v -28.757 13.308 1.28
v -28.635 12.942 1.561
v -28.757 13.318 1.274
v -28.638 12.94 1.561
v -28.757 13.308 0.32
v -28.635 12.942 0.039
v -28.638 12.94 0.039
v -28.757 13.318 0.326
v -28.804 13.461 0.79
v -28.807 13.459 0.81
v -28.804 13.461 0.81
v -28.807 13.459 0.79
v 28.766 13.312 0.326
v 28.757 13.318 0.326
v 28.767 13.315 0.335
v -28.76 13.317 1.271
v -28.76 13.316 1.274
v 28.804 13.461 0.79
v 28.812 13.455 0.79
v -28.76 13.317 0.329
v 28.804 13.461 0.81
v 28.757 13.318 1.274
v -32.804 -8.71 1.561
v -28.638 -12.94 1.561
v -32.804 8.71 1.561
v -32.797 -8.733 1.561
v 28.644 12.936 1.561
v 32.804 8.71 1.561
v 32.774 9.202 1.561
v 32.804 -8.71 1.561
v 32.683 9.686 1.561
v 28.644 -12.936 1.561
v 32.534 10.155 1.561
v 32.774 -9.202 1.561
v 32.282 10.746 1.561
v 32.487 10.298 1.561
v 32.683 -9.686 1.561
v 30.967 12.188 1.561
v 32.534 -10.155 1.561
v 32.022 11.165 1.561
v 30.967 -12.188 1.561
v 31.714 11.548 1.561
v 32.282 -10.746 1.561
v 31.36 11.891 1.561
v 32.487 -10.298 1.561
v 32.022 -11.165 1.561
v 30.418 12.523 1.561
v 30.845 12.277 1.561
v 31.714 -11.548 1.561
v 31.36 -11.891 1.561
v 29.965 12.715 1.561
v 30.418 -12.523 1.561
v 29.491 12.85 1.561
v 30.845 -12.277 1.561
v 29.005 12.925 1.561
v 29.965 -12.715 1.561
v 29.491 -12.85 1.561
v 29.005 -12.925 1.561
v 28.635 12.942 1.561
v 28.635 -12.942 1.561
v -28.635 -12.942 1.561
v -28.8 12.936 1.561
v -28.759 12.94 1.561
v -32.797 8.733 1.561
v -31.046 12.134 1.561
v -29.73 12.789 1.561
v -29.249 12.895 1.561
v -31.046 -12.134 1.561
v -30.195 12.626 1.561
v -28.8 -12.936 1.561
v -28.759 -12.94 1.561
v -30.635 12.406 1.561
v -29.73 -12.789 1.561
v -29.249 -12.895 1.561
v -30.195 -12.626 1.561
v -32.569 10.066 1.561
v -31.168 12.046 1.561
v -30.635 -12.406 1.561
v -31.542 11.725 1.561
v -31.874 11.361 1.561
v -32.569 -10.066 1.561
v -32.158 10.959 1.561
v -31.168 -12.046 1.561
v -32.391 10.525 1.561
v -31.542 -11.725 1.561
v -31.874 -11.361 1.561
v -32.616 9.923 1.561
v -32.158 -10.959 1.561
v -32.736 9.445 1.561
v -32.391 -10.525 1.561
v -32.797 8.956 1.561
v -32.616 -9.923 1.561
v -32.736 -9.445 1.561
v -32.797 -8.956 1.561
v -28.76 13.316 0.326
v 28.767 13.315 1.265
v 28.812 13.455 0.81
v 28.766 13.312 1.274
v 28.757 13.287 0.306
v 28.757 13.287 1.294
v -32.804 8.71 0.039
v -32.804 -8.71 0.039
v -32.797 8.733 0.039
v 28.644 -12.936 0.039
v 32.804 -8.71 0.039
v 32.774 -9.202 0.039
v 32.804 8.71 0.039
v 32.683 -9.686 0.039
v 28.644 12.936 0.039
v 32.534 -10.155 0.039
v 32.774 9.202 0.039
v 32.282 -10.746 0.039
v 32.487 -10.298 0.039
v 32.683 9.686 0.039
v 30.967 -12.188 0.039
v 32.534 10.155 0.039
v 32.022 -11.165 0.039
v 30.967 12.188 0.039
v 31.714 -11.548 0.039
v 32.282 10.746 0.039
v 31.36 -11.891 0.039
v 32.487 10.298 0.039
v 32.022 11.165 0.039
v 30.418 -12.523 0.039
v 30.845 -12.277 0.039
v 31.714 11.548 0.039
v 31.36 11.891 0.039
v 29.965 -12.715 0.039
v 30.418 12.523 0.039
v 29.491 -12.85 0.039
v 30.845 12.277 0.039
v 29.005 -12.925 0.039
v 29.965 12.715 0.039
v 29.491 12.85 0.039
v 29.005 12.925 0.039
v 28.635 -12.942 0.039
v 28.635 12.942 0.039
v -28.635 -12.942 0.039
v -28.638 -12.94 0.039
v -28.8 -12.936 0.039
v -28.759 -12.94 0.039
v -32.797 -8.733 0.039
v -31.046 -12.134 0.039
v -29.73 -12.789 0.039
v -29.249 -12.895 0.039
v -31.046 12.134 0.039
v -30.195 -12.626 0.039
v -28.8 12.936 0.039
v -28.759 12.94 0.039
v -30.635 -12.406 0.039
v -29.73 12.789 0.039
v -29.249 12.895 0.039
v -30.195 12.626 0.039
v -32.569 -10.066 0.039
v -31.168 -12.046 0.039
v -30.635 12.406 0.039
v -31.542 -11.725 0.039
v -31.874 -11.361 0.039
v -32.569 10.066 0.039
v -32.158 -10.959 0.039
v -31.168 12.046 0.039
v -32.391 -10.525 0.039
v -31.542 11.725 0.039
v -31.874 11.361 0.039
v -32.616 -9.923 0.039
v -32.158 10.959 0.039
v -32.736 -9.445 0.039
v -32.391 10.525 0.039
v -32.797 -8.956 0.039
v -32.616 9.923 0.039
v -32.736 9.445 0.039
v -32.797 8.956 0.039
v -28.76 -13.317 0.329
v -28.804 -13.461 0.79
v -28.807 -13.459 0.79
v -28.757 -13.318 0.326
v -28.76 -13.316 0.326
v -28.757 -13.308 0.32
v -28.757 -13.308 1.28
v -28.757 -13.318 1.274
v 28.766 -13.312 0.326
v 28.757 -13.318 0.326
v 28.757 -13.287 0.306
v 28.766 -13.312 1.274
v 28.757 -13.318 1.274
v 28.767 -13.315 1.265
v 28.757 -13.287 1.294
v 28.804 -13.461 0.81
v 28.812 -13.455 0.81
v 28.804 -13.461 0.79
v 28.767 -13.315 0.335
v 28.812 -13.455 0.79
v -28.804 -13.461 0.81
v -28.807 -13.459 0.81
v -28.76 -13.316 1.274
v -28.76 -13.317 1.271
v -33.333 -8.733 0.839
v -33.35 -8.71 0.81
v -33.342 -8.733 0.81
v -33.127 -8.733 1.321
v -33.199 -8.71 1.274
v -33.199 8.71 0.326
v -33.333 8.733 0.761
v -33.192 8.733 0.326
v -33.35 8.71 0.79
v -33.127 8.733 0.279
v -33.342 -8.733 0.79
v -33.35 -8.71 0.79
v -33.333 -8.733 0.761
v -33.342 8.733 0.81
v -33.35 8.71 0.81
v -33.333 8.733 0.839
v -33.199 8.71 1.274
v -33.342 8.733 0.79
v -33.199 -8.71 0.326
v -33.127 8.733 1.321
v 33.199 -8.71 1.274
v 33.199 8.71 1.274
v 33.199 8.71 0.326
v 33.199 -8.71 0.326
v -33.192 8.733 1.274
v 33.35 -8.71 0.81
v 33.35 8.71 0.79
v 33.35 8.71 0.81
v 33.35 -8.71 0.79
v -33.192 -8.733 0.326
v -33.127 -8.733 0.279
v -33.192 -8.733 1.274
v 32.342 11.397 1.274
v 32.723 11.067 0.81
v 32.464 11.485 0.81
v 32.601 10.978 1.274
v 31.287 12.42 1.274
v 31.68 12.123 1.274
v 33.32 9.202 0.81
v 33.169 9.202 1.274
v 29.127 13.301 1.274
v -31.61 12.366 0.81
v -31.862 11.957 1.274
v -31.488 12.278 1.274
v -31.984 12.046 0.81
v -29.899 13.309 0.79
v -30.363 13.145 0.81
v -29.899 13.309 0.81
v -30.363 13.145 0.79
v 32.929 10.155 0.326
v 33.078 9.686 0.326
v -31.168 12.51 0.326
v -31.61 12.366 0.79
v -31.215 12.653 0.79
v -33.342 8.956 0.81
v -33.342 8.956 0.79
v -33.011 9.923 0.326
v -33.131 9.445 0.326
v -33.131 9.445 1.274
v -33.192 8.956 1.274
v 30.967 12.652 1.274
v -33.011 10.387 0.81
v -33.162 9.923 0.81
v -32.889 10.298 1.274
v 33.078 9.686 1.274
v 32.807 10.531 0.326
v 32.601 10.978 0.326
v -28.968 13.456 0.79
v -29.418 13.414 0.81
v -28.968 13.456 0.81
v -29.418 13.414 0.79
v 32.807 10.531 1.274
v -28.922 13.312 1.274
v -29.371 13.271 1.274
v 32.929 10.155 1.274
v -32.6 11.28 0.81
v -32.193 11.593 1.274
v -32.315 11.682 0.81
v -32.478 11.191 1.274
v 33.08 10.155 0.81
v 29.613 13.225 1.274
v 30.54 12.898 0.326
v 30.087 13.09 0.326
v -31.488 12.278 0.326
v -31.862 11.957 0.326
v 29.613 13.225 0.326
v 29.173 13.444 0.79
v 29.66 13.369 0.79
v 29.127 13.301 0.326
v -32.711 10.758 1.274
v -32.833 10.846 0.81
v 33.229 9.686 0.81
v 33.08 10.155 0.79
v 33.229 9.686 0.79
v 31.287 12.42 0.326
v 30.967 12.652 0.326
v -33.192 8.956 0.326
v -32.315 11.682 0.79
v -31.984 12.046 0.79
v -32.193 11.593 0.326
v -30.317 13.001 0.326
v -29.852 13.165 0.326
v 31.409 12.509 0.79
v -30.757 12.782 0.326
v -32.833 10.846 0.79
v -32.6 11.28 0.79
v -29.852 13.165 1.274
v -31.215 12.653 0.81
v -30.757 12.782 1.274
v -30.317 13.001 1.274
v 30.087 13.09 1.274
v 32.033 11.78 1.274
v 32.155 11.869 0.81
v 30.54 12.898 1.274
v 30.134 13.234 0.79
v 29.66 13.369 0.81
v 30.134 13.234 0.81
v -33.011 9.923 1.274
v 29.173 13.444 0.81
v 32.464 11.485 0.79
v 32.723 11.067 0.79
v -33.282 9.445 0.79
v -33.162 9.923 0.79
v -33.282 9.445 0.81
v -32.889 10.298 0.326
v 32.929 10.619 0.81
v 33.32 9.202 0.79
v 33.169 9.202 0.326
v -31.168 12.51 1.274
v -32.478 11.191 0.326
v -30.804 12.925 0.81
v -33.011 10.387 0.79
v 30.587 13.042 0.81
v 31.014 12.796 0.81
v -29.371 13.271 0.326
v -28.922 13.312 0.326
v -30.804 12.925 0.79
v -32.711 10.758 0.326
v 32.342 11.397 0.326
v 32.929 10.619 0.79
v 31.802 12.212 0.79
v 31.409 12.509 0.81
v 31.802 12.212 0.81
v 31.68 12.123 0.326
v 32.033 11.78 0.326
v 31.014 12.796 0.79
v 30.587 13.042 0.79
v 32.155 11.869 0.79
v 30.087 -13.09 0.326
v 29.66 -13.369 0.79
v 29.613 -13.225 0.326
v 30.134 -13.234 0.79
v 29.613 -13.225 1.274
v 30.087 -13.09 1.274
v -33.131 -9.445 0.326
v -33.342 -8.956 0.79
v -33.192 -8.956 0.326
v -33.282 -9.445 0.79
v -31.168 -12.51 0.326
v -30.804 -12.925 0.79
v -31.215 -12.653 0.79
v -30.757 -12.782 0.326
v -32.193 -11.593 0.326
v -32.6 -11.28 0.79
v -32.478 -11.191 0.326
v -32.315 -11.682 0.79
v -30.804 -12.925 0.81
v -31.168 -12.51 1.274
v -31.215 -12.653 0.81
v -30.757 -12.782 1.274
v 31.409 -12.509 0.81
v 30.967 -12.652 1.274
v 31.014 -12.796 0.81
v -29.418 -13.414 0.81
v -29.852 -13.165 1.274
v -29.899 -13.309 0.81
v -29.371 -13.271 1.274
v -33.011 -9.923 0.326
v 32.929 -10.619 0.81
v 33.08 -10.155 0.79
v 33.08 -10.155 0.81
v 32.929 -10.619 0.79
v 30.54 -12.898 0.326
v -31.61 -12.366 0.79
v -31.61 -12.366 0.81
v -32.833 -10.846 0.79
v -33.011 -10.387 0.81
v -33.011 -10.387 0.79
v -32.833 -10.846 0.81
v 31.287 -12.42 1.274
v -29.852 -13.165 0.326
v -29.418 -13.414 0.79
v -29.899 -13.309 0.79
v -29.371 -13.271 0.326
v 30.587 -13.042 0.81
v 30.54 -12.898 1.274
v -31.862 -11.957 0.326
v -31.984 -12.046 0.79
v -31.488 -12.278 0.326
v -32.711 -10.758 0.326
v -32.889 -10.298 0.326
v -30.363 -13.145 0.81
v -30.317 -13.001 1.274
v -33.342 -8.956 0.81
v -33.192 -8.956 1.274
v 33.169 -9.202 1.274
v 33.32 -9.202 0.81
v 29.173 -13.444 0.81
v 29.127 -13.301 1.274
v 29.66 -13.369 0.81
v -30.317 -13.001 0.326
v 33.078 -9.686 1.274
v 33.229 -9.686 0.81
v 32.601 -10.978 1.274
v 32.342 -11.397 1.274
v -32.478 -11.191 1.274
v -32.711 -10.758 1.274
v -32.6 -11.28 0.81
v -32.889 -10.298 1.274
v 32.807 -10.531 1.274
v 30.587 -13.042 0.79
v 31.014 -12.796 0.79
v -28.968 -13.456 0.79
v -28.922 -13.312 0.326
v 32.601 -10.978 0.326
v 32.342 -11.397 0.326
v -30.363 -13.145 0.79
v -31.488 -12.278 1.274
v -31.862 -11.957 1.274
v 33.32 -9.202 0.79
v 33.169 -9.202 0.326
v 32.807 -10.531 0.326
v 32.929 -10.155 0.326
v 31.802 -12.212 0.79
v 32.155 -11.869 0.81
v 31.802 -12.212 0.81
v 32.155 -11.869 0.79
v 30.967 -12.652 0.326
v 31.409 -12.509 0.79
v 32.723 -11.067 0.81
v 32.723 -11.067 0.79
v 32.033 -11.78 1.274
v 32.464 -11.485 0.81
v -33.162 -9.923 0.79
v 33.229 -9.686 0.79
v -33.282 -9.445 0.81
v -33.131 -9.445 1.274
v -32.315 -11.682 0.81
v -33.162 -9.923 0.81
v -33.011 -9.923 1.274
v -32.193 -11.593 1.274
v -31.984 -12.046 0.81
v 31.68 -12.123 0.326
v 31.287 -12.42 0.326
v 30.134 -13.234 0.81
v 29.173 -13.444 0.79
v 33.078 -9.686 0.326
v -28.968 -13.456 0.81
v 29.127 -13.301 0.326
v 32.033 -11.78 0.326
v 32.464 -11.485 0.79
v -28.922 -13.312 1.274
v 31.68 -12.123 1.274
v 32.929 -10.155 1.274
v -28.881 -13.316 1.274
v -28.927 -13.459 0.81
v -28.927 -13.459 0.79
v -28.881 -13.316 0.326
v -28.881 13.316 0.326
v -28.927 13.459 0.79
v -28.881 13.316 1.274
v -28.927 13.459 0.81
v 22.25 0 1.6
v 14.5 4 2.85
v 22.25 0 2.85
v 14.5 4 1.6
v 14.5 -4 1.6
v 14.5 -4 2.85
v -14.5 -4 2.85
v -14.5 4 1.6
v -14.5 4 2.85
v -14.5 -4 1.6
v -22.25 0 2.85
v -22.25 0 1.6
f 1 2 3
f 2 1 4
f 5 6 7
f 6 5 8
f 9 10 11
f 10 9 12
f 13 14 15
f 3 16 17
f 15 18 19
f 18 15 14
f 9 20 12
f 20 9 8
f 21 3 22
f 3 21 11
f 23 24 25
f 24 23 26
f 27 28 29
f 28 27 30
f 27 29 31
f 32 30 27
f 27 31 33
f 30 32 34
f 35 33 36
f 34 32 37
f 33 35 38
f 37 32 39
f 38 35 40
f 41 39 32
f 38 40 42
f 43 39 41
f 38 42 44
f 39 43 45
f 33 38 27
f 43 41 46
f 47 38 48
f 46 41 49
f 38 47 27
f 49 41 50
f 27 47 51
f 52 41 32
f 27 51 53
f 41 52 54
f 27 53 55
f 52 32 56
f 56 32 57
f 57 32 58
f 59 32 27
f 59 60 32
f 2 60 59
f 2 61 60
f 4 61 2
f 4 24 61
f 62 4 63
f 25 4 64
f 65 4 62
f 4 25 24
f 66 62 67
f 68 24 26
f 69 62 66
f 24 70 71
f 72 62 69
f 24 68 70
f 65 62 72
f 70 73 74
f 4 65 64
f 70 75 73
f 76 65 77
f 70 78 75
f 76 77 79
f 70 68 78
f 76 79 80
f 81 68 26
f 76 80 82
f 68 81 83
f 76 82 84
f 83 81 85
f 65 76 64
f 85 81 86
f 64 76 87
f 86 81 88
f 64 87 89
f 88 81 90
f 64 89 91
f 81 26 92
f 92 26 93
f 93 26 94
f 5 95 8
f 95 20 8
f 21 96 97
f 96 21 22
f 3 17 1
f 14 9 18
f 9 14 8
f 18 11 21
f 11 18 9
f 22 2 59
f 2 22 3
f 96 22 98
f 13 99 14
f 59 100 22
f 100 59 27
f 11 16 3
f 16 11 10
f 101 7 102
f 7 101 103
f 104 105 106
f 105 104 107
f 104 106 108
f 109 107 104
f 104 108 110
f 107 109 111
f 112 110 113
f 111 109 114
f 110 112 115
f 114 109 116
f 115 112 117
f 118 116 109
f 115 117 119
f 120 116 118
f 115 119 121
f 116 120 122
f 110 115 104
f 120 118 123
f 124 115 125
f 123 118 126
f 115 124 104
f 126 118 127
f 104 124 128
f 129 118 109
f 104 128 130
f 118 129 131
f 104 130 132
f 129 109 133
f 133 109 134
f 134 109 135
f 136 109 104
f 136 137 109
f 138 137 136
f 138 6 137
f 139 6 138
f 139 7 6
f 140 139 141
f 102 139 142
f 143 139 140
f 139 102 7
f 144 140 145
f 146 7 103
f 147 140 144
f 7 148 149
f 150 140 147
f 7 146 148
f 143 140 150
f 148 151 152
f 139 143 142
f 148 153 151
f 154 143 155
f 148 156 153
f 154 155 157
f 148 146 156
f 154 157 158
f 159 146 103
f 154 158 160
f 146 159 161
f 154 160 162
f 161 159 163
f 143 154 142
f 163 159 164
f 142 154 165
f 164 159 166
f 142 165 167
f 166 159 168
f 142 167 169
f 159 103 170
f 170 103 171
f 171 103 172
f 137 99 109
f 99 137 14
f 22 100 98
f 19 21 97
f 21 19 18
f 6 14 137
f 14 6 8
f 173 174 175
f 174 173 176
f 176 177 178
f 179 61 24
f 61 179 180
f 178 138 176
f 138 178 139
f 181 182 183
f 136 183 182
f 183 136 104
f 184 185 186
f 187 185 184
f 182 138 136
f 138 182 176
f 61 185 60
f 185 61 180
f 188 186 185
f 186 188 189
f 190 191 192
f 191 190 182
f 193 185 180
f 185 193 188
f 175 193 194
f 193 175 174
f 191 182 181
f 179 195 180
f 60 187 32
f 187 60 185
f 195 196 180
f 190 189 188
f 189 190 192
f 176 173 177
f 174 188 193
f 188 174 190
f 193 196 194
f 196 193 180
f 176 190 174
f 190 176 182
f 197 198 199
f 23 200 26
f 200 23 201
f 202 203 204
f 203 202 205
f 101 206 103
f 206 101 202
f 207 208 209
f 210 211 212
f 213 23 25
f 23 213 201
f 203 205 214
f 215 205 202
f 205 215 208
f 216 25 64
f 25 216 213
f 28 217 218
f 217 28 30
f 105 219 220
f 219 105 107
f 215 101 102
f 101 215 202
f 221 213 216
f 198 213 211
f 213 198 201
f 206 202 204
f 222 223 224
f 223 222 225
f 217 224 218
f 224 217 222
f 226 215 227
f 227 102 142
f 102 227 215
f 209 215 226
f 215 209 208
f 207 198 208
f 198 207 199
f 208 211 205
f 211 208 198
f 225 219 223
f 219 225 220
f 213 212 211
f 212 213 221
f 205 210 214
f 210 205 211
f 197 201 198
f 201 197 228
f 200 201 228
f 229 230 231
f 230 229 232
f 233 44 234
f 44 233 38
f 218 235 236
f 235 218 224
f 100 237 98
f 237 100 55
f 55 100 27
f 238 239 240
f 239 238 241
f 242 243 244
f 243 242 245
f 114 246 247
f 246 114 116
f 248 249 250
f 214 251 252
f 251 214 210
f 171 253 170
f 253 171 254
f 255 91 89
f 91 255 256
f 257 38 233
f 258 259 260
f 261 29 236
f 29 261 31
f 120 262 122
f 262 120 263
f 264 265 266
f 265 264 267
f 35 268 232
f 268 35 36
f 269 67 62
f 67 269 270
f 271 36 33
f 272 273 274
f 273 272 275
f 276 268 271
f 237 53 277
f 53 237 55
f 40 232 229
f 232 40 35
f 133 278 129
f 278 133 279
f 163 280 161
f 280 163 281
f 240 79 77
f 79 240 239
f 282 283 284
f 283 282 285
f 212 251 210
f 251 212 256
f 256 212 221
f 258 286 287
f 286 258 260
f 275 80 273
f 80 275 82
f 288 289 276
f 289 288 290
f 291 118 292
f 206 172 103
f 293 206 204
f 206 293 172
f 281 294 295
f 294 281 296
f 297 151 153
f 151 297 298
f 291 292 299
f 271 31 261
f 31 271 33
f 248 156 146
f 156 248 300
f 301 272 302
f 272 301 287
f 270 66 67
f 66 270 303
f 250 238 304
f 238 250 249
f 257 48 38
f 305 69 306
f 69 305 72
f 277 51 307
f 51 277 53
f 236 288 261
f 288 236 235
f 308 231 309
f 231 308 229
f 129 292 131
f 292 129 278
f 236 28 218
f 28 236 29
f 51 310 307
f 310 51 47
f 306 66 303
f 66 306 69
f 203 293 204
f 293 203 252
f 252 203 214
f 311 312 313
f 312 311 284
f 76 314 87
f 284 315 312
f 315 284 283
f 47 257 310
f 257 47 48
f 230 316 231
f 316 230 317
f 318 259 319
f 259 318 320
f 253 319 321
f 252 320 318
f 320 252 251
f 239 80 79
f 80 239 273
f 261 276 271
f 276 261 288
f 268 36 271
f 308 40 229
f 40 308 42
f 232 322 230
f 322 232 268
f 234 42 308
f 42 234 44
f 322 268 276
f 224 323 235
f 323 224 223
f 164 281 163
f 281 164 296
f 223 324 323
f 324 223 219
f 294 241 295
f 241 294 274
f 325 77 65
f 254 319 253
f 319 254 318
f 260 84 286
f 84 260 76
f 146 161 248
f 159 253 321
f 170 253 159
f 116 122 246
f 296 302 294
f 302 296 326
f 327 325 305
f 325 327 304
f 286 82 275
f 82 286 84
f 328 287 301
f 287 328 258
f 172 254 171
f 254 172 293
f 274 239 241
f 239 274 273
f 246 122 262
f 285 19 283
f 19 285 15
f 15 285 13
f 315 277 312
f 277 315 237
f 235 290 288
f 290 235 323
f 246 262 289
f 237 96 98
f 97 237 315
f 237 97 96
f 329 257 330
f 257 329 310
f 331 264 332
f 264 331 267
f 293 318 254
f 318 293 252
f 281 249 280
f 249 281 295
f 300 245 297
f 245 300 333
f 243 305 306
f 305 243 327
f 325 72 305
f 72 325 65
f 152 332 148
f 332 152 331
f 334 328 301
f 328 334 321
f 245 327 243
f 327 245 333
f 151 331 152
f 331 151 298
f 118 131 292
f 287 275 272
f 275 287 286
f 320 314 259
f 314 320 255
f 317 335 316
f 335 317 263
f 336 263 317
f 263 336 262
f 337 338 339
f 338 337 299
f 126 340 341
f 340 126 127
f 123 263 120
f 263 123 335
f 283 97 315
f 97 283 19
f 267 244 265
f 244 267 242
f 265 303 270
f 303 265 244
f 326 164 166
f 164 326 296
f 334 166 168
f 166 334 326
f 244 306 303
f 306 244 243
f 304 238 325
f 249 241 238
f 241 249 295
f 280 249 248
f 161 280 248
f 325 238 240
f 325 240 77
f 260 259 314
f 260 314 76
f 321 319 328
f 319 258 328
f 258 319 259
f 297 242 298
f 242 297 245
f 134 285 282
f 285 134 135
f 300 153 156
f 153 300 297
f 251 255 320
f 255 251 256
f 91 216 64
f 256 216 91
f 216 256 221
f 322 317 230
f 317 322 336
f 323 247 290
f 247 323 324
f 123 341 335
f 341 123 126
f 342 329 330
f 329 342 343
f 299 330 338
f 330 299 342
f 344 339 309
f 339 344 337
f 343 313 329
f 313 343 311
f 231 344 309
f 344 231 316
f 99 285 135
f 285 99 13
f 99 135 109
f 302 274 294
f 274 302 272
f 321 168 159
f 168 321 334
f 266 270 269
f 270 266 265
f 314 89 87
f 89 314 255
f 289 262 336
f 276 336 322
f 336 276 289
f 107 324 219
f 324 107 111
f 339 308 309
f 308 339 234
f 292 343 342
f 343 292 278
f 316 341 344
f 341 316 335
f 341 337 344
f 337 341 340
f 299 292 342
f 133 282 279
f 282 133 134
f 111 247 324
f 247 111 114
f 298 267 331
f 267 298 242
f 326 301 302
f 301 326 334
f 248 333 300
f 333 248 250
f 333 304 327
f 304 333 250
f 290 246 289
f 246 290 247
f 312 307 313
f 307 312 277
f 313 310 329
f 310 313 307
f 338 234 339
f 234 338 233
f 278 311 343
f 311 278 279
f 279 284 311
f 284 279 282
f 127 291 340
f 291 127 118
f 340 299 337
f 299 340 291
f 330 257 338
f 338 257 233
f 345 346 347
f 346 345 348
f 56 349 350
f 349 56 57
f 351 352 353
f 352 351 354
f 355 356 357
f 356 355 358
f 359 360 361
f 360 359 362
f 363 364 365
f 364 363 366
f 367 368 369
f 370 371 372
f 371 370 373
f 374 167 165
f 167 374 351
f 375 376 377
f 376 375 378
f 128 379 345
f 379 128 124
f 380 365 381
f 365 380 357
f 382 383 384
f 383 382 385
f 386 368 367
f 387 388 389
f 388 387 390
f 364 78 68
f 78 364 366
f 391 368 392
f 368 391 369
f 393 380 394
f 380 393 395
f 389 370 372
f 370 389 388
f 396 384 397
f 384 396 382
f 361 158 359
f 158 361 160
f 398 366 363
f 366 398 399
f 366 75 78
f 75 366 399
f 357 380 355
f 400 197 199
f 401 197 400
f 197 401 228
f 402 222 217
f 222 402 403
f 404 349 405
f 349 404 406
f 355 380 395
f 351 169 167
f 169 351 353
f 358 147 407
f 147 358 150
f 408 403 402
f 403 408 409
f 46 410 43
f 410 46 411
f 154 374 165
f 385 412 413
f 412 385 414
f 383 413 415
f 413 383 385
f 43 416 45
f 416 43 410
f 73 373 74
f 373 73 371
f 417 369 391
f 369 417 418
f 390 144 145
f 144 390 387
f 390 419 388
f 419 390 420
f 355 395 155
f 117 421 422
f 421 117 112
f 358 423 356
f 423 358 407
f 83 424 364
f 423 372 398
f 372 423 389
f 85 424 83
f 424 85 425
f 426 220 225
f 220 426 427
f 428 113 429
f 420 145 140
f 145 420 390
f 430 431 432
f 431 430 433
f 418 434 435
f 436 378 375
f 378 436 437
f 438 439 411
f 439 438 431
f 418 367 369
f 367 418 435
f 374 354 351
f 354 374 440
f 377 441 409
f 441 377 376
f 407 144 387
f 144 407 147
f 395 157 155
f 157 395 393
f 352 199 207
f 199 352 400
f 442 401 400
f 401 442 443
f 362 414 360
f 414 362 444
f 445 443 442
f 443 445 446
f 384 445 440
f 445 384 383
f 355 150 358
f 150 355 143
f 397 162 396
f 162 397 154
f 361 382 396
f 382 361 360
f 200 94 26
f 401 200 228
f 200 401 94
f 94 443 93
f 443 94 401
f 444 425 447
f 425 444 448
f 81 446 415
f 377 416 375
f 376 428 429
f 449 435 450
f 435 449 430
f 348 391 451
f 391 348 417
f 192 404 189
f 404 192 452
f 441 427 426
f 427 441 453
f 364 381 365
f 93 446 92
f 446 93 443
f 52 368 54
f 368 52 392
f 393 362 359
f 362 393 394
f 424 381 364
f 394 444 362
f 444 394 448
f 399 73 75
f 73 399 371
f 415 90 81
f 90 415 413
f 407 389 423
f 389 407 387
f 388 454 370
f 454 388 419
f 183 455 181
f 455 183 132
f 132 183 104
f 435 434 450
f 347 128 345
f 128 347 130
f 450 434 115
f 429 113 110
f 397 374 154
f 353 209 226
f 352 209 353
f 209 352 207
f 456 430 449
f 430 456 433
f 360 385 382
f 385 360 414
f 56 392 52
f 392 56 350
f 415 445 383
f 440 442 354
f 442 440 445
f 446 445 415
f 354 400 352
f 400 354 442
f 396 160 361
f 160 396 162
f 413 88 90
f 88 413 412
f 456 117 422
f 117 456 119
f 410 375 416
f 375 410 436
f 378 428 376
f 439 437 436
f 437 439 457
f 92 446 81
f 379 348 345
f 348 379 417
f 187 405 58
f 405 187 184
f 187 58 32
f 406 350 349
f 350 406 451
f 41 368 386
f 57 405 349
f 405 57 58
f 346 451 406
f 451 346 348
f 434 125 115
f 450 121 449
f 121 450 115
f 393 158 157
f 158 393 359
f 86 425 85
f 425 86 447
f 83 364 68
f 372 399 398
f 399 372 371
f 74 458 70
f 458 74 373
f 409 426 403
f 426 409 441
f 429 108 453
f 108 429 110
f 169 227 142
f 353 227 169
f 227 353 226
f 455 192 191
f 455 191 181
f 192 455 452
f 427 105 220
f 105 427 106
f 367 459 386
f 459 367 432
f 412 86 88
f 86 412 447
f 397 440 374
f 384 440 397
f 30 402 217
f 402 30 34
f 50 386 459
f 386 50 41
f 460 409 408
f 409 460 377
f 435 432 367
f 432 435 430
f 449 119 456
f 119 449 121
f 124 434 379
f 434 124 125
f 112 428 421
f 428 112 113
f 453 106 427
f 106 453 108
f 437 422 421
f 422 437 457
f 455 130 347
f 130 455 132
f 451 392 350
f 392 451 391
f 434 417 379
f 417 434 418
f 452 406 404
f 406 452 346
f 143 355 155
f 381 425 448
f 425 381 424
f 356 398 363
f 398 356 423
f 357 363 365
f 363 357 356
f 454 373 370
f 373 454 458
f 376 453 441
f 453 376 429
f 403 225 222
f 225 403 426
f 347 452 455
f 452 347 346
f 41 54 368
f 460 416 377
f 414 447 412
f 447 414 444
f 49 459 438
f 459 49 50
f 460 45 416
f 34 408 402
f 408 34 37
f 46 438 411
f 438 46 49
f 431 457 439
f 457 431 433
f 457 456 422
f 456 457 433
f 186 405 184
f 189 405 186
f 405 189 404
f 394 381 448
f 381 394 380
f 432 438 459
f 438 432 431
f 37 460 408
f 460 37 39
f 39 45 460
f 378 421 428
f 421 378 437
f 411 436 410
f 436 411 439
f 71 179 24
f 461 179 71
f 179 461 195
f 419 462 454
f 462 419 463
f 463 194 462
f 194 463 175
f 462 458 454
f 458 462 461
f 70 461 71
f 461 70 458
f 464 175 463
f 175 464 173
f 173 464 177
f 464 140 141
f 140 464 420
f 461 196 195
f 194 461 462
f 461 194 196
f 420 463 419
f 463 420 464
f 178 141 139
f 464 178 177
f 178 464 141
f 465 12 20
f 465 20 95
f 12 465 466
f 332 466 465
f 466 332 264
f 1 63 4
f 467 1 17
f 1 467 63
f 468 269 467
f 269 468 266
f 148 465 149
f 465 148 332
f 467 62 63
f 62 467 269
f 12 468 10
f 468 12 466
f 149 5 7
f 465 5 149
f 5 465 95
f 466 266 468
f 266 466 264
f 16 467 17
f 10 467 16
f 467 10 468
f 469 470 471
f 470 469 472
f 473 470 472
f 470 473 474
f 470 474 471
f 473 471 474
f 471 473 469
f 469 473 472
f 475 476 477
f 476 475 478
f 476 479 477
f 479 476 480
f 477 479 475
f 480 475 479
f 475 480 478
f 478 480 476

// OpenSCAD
include <MCAD/shapes.scad>

$fs = 0.5;
$fa = 0.5;

// Parameters for base shape of the connector
base_length = 66.7;
base_width = 27;
base_thickness = 1.6;

// Parameters for edge rounding
end_rounding_radius = 4; // Large radius at 4 corners
edge_rounding_radius = base_thickness / 2 - 0.01; // Small radius for edge treatment

// Arrow dimensions (for locking into track cutouts)
arrow_length = 7.75;
arrow_width = 8;
arrow_thickness = 1.25;

// Spacing between flat backs of arrows
arrow_separation = 29;

// --------

// Defines base coupling for sliding into track grooves
module baseplate(dims, edge_radius, end_radius) {
    length = dims[0];
    width = dims[1];
    height = dims[2];
    translate([0, 0, base_thickness / 2]) {
        minkowski() {
            roundedBox(
                width=length - 2 * edge_radius,
                height=width - 2 * edge_radius,
                depth=height - 2 * edge_radius,
                radius=end_radius
            );
            sphere(r=edge_radius);
        }
    }
}

// Defines locking arrow for interfacing with track pieces
module arrow_lock(dims) {
    length = dims[0];
    width = dims[1];
    height = dims[2];        
    vertices = [
        [0, width/2, 0],
        [0, width/2, height],
        [0, -width/2, height],
        [0, -width/2, 0],
        [length, 0, 0],
        [length, 0, height]
    ];
    faces = [
        [0, 1, 2, 3], // back of triangle
        [0, 3, 4], // top of triangle
        [1, 5, 2], // bottom of triangle
        [0, 4, 5, 1], // angle face 1
        [2, 5, 4, 3] // angle face 2
    ];
    polyhedron(
        points=vertices,
        faces=faces,
        convexity=2
    );
}

// v-------- Active geometry --------v

baseplate(
    [base_length, base_width, base_thickness],
    edge_radius=edge_rounding_radius,
    end_radius=end_rounding_radius
);

translate([0, 0, base_thickness]) {
    translate([arrow_separation/2, 0, 0]) {
        arrow_lock([
            arrow_length,
            arrow_width,
            arrow_thickness
        ]);
    }
    translate([-arrow_separation/2, 0, 0]) {
        mirror([1, 0, 0]) {
            arrow_lock([
                arrow_length,
                arrow_width,
                arrow_thickness
            ]);
        }
    }
}
